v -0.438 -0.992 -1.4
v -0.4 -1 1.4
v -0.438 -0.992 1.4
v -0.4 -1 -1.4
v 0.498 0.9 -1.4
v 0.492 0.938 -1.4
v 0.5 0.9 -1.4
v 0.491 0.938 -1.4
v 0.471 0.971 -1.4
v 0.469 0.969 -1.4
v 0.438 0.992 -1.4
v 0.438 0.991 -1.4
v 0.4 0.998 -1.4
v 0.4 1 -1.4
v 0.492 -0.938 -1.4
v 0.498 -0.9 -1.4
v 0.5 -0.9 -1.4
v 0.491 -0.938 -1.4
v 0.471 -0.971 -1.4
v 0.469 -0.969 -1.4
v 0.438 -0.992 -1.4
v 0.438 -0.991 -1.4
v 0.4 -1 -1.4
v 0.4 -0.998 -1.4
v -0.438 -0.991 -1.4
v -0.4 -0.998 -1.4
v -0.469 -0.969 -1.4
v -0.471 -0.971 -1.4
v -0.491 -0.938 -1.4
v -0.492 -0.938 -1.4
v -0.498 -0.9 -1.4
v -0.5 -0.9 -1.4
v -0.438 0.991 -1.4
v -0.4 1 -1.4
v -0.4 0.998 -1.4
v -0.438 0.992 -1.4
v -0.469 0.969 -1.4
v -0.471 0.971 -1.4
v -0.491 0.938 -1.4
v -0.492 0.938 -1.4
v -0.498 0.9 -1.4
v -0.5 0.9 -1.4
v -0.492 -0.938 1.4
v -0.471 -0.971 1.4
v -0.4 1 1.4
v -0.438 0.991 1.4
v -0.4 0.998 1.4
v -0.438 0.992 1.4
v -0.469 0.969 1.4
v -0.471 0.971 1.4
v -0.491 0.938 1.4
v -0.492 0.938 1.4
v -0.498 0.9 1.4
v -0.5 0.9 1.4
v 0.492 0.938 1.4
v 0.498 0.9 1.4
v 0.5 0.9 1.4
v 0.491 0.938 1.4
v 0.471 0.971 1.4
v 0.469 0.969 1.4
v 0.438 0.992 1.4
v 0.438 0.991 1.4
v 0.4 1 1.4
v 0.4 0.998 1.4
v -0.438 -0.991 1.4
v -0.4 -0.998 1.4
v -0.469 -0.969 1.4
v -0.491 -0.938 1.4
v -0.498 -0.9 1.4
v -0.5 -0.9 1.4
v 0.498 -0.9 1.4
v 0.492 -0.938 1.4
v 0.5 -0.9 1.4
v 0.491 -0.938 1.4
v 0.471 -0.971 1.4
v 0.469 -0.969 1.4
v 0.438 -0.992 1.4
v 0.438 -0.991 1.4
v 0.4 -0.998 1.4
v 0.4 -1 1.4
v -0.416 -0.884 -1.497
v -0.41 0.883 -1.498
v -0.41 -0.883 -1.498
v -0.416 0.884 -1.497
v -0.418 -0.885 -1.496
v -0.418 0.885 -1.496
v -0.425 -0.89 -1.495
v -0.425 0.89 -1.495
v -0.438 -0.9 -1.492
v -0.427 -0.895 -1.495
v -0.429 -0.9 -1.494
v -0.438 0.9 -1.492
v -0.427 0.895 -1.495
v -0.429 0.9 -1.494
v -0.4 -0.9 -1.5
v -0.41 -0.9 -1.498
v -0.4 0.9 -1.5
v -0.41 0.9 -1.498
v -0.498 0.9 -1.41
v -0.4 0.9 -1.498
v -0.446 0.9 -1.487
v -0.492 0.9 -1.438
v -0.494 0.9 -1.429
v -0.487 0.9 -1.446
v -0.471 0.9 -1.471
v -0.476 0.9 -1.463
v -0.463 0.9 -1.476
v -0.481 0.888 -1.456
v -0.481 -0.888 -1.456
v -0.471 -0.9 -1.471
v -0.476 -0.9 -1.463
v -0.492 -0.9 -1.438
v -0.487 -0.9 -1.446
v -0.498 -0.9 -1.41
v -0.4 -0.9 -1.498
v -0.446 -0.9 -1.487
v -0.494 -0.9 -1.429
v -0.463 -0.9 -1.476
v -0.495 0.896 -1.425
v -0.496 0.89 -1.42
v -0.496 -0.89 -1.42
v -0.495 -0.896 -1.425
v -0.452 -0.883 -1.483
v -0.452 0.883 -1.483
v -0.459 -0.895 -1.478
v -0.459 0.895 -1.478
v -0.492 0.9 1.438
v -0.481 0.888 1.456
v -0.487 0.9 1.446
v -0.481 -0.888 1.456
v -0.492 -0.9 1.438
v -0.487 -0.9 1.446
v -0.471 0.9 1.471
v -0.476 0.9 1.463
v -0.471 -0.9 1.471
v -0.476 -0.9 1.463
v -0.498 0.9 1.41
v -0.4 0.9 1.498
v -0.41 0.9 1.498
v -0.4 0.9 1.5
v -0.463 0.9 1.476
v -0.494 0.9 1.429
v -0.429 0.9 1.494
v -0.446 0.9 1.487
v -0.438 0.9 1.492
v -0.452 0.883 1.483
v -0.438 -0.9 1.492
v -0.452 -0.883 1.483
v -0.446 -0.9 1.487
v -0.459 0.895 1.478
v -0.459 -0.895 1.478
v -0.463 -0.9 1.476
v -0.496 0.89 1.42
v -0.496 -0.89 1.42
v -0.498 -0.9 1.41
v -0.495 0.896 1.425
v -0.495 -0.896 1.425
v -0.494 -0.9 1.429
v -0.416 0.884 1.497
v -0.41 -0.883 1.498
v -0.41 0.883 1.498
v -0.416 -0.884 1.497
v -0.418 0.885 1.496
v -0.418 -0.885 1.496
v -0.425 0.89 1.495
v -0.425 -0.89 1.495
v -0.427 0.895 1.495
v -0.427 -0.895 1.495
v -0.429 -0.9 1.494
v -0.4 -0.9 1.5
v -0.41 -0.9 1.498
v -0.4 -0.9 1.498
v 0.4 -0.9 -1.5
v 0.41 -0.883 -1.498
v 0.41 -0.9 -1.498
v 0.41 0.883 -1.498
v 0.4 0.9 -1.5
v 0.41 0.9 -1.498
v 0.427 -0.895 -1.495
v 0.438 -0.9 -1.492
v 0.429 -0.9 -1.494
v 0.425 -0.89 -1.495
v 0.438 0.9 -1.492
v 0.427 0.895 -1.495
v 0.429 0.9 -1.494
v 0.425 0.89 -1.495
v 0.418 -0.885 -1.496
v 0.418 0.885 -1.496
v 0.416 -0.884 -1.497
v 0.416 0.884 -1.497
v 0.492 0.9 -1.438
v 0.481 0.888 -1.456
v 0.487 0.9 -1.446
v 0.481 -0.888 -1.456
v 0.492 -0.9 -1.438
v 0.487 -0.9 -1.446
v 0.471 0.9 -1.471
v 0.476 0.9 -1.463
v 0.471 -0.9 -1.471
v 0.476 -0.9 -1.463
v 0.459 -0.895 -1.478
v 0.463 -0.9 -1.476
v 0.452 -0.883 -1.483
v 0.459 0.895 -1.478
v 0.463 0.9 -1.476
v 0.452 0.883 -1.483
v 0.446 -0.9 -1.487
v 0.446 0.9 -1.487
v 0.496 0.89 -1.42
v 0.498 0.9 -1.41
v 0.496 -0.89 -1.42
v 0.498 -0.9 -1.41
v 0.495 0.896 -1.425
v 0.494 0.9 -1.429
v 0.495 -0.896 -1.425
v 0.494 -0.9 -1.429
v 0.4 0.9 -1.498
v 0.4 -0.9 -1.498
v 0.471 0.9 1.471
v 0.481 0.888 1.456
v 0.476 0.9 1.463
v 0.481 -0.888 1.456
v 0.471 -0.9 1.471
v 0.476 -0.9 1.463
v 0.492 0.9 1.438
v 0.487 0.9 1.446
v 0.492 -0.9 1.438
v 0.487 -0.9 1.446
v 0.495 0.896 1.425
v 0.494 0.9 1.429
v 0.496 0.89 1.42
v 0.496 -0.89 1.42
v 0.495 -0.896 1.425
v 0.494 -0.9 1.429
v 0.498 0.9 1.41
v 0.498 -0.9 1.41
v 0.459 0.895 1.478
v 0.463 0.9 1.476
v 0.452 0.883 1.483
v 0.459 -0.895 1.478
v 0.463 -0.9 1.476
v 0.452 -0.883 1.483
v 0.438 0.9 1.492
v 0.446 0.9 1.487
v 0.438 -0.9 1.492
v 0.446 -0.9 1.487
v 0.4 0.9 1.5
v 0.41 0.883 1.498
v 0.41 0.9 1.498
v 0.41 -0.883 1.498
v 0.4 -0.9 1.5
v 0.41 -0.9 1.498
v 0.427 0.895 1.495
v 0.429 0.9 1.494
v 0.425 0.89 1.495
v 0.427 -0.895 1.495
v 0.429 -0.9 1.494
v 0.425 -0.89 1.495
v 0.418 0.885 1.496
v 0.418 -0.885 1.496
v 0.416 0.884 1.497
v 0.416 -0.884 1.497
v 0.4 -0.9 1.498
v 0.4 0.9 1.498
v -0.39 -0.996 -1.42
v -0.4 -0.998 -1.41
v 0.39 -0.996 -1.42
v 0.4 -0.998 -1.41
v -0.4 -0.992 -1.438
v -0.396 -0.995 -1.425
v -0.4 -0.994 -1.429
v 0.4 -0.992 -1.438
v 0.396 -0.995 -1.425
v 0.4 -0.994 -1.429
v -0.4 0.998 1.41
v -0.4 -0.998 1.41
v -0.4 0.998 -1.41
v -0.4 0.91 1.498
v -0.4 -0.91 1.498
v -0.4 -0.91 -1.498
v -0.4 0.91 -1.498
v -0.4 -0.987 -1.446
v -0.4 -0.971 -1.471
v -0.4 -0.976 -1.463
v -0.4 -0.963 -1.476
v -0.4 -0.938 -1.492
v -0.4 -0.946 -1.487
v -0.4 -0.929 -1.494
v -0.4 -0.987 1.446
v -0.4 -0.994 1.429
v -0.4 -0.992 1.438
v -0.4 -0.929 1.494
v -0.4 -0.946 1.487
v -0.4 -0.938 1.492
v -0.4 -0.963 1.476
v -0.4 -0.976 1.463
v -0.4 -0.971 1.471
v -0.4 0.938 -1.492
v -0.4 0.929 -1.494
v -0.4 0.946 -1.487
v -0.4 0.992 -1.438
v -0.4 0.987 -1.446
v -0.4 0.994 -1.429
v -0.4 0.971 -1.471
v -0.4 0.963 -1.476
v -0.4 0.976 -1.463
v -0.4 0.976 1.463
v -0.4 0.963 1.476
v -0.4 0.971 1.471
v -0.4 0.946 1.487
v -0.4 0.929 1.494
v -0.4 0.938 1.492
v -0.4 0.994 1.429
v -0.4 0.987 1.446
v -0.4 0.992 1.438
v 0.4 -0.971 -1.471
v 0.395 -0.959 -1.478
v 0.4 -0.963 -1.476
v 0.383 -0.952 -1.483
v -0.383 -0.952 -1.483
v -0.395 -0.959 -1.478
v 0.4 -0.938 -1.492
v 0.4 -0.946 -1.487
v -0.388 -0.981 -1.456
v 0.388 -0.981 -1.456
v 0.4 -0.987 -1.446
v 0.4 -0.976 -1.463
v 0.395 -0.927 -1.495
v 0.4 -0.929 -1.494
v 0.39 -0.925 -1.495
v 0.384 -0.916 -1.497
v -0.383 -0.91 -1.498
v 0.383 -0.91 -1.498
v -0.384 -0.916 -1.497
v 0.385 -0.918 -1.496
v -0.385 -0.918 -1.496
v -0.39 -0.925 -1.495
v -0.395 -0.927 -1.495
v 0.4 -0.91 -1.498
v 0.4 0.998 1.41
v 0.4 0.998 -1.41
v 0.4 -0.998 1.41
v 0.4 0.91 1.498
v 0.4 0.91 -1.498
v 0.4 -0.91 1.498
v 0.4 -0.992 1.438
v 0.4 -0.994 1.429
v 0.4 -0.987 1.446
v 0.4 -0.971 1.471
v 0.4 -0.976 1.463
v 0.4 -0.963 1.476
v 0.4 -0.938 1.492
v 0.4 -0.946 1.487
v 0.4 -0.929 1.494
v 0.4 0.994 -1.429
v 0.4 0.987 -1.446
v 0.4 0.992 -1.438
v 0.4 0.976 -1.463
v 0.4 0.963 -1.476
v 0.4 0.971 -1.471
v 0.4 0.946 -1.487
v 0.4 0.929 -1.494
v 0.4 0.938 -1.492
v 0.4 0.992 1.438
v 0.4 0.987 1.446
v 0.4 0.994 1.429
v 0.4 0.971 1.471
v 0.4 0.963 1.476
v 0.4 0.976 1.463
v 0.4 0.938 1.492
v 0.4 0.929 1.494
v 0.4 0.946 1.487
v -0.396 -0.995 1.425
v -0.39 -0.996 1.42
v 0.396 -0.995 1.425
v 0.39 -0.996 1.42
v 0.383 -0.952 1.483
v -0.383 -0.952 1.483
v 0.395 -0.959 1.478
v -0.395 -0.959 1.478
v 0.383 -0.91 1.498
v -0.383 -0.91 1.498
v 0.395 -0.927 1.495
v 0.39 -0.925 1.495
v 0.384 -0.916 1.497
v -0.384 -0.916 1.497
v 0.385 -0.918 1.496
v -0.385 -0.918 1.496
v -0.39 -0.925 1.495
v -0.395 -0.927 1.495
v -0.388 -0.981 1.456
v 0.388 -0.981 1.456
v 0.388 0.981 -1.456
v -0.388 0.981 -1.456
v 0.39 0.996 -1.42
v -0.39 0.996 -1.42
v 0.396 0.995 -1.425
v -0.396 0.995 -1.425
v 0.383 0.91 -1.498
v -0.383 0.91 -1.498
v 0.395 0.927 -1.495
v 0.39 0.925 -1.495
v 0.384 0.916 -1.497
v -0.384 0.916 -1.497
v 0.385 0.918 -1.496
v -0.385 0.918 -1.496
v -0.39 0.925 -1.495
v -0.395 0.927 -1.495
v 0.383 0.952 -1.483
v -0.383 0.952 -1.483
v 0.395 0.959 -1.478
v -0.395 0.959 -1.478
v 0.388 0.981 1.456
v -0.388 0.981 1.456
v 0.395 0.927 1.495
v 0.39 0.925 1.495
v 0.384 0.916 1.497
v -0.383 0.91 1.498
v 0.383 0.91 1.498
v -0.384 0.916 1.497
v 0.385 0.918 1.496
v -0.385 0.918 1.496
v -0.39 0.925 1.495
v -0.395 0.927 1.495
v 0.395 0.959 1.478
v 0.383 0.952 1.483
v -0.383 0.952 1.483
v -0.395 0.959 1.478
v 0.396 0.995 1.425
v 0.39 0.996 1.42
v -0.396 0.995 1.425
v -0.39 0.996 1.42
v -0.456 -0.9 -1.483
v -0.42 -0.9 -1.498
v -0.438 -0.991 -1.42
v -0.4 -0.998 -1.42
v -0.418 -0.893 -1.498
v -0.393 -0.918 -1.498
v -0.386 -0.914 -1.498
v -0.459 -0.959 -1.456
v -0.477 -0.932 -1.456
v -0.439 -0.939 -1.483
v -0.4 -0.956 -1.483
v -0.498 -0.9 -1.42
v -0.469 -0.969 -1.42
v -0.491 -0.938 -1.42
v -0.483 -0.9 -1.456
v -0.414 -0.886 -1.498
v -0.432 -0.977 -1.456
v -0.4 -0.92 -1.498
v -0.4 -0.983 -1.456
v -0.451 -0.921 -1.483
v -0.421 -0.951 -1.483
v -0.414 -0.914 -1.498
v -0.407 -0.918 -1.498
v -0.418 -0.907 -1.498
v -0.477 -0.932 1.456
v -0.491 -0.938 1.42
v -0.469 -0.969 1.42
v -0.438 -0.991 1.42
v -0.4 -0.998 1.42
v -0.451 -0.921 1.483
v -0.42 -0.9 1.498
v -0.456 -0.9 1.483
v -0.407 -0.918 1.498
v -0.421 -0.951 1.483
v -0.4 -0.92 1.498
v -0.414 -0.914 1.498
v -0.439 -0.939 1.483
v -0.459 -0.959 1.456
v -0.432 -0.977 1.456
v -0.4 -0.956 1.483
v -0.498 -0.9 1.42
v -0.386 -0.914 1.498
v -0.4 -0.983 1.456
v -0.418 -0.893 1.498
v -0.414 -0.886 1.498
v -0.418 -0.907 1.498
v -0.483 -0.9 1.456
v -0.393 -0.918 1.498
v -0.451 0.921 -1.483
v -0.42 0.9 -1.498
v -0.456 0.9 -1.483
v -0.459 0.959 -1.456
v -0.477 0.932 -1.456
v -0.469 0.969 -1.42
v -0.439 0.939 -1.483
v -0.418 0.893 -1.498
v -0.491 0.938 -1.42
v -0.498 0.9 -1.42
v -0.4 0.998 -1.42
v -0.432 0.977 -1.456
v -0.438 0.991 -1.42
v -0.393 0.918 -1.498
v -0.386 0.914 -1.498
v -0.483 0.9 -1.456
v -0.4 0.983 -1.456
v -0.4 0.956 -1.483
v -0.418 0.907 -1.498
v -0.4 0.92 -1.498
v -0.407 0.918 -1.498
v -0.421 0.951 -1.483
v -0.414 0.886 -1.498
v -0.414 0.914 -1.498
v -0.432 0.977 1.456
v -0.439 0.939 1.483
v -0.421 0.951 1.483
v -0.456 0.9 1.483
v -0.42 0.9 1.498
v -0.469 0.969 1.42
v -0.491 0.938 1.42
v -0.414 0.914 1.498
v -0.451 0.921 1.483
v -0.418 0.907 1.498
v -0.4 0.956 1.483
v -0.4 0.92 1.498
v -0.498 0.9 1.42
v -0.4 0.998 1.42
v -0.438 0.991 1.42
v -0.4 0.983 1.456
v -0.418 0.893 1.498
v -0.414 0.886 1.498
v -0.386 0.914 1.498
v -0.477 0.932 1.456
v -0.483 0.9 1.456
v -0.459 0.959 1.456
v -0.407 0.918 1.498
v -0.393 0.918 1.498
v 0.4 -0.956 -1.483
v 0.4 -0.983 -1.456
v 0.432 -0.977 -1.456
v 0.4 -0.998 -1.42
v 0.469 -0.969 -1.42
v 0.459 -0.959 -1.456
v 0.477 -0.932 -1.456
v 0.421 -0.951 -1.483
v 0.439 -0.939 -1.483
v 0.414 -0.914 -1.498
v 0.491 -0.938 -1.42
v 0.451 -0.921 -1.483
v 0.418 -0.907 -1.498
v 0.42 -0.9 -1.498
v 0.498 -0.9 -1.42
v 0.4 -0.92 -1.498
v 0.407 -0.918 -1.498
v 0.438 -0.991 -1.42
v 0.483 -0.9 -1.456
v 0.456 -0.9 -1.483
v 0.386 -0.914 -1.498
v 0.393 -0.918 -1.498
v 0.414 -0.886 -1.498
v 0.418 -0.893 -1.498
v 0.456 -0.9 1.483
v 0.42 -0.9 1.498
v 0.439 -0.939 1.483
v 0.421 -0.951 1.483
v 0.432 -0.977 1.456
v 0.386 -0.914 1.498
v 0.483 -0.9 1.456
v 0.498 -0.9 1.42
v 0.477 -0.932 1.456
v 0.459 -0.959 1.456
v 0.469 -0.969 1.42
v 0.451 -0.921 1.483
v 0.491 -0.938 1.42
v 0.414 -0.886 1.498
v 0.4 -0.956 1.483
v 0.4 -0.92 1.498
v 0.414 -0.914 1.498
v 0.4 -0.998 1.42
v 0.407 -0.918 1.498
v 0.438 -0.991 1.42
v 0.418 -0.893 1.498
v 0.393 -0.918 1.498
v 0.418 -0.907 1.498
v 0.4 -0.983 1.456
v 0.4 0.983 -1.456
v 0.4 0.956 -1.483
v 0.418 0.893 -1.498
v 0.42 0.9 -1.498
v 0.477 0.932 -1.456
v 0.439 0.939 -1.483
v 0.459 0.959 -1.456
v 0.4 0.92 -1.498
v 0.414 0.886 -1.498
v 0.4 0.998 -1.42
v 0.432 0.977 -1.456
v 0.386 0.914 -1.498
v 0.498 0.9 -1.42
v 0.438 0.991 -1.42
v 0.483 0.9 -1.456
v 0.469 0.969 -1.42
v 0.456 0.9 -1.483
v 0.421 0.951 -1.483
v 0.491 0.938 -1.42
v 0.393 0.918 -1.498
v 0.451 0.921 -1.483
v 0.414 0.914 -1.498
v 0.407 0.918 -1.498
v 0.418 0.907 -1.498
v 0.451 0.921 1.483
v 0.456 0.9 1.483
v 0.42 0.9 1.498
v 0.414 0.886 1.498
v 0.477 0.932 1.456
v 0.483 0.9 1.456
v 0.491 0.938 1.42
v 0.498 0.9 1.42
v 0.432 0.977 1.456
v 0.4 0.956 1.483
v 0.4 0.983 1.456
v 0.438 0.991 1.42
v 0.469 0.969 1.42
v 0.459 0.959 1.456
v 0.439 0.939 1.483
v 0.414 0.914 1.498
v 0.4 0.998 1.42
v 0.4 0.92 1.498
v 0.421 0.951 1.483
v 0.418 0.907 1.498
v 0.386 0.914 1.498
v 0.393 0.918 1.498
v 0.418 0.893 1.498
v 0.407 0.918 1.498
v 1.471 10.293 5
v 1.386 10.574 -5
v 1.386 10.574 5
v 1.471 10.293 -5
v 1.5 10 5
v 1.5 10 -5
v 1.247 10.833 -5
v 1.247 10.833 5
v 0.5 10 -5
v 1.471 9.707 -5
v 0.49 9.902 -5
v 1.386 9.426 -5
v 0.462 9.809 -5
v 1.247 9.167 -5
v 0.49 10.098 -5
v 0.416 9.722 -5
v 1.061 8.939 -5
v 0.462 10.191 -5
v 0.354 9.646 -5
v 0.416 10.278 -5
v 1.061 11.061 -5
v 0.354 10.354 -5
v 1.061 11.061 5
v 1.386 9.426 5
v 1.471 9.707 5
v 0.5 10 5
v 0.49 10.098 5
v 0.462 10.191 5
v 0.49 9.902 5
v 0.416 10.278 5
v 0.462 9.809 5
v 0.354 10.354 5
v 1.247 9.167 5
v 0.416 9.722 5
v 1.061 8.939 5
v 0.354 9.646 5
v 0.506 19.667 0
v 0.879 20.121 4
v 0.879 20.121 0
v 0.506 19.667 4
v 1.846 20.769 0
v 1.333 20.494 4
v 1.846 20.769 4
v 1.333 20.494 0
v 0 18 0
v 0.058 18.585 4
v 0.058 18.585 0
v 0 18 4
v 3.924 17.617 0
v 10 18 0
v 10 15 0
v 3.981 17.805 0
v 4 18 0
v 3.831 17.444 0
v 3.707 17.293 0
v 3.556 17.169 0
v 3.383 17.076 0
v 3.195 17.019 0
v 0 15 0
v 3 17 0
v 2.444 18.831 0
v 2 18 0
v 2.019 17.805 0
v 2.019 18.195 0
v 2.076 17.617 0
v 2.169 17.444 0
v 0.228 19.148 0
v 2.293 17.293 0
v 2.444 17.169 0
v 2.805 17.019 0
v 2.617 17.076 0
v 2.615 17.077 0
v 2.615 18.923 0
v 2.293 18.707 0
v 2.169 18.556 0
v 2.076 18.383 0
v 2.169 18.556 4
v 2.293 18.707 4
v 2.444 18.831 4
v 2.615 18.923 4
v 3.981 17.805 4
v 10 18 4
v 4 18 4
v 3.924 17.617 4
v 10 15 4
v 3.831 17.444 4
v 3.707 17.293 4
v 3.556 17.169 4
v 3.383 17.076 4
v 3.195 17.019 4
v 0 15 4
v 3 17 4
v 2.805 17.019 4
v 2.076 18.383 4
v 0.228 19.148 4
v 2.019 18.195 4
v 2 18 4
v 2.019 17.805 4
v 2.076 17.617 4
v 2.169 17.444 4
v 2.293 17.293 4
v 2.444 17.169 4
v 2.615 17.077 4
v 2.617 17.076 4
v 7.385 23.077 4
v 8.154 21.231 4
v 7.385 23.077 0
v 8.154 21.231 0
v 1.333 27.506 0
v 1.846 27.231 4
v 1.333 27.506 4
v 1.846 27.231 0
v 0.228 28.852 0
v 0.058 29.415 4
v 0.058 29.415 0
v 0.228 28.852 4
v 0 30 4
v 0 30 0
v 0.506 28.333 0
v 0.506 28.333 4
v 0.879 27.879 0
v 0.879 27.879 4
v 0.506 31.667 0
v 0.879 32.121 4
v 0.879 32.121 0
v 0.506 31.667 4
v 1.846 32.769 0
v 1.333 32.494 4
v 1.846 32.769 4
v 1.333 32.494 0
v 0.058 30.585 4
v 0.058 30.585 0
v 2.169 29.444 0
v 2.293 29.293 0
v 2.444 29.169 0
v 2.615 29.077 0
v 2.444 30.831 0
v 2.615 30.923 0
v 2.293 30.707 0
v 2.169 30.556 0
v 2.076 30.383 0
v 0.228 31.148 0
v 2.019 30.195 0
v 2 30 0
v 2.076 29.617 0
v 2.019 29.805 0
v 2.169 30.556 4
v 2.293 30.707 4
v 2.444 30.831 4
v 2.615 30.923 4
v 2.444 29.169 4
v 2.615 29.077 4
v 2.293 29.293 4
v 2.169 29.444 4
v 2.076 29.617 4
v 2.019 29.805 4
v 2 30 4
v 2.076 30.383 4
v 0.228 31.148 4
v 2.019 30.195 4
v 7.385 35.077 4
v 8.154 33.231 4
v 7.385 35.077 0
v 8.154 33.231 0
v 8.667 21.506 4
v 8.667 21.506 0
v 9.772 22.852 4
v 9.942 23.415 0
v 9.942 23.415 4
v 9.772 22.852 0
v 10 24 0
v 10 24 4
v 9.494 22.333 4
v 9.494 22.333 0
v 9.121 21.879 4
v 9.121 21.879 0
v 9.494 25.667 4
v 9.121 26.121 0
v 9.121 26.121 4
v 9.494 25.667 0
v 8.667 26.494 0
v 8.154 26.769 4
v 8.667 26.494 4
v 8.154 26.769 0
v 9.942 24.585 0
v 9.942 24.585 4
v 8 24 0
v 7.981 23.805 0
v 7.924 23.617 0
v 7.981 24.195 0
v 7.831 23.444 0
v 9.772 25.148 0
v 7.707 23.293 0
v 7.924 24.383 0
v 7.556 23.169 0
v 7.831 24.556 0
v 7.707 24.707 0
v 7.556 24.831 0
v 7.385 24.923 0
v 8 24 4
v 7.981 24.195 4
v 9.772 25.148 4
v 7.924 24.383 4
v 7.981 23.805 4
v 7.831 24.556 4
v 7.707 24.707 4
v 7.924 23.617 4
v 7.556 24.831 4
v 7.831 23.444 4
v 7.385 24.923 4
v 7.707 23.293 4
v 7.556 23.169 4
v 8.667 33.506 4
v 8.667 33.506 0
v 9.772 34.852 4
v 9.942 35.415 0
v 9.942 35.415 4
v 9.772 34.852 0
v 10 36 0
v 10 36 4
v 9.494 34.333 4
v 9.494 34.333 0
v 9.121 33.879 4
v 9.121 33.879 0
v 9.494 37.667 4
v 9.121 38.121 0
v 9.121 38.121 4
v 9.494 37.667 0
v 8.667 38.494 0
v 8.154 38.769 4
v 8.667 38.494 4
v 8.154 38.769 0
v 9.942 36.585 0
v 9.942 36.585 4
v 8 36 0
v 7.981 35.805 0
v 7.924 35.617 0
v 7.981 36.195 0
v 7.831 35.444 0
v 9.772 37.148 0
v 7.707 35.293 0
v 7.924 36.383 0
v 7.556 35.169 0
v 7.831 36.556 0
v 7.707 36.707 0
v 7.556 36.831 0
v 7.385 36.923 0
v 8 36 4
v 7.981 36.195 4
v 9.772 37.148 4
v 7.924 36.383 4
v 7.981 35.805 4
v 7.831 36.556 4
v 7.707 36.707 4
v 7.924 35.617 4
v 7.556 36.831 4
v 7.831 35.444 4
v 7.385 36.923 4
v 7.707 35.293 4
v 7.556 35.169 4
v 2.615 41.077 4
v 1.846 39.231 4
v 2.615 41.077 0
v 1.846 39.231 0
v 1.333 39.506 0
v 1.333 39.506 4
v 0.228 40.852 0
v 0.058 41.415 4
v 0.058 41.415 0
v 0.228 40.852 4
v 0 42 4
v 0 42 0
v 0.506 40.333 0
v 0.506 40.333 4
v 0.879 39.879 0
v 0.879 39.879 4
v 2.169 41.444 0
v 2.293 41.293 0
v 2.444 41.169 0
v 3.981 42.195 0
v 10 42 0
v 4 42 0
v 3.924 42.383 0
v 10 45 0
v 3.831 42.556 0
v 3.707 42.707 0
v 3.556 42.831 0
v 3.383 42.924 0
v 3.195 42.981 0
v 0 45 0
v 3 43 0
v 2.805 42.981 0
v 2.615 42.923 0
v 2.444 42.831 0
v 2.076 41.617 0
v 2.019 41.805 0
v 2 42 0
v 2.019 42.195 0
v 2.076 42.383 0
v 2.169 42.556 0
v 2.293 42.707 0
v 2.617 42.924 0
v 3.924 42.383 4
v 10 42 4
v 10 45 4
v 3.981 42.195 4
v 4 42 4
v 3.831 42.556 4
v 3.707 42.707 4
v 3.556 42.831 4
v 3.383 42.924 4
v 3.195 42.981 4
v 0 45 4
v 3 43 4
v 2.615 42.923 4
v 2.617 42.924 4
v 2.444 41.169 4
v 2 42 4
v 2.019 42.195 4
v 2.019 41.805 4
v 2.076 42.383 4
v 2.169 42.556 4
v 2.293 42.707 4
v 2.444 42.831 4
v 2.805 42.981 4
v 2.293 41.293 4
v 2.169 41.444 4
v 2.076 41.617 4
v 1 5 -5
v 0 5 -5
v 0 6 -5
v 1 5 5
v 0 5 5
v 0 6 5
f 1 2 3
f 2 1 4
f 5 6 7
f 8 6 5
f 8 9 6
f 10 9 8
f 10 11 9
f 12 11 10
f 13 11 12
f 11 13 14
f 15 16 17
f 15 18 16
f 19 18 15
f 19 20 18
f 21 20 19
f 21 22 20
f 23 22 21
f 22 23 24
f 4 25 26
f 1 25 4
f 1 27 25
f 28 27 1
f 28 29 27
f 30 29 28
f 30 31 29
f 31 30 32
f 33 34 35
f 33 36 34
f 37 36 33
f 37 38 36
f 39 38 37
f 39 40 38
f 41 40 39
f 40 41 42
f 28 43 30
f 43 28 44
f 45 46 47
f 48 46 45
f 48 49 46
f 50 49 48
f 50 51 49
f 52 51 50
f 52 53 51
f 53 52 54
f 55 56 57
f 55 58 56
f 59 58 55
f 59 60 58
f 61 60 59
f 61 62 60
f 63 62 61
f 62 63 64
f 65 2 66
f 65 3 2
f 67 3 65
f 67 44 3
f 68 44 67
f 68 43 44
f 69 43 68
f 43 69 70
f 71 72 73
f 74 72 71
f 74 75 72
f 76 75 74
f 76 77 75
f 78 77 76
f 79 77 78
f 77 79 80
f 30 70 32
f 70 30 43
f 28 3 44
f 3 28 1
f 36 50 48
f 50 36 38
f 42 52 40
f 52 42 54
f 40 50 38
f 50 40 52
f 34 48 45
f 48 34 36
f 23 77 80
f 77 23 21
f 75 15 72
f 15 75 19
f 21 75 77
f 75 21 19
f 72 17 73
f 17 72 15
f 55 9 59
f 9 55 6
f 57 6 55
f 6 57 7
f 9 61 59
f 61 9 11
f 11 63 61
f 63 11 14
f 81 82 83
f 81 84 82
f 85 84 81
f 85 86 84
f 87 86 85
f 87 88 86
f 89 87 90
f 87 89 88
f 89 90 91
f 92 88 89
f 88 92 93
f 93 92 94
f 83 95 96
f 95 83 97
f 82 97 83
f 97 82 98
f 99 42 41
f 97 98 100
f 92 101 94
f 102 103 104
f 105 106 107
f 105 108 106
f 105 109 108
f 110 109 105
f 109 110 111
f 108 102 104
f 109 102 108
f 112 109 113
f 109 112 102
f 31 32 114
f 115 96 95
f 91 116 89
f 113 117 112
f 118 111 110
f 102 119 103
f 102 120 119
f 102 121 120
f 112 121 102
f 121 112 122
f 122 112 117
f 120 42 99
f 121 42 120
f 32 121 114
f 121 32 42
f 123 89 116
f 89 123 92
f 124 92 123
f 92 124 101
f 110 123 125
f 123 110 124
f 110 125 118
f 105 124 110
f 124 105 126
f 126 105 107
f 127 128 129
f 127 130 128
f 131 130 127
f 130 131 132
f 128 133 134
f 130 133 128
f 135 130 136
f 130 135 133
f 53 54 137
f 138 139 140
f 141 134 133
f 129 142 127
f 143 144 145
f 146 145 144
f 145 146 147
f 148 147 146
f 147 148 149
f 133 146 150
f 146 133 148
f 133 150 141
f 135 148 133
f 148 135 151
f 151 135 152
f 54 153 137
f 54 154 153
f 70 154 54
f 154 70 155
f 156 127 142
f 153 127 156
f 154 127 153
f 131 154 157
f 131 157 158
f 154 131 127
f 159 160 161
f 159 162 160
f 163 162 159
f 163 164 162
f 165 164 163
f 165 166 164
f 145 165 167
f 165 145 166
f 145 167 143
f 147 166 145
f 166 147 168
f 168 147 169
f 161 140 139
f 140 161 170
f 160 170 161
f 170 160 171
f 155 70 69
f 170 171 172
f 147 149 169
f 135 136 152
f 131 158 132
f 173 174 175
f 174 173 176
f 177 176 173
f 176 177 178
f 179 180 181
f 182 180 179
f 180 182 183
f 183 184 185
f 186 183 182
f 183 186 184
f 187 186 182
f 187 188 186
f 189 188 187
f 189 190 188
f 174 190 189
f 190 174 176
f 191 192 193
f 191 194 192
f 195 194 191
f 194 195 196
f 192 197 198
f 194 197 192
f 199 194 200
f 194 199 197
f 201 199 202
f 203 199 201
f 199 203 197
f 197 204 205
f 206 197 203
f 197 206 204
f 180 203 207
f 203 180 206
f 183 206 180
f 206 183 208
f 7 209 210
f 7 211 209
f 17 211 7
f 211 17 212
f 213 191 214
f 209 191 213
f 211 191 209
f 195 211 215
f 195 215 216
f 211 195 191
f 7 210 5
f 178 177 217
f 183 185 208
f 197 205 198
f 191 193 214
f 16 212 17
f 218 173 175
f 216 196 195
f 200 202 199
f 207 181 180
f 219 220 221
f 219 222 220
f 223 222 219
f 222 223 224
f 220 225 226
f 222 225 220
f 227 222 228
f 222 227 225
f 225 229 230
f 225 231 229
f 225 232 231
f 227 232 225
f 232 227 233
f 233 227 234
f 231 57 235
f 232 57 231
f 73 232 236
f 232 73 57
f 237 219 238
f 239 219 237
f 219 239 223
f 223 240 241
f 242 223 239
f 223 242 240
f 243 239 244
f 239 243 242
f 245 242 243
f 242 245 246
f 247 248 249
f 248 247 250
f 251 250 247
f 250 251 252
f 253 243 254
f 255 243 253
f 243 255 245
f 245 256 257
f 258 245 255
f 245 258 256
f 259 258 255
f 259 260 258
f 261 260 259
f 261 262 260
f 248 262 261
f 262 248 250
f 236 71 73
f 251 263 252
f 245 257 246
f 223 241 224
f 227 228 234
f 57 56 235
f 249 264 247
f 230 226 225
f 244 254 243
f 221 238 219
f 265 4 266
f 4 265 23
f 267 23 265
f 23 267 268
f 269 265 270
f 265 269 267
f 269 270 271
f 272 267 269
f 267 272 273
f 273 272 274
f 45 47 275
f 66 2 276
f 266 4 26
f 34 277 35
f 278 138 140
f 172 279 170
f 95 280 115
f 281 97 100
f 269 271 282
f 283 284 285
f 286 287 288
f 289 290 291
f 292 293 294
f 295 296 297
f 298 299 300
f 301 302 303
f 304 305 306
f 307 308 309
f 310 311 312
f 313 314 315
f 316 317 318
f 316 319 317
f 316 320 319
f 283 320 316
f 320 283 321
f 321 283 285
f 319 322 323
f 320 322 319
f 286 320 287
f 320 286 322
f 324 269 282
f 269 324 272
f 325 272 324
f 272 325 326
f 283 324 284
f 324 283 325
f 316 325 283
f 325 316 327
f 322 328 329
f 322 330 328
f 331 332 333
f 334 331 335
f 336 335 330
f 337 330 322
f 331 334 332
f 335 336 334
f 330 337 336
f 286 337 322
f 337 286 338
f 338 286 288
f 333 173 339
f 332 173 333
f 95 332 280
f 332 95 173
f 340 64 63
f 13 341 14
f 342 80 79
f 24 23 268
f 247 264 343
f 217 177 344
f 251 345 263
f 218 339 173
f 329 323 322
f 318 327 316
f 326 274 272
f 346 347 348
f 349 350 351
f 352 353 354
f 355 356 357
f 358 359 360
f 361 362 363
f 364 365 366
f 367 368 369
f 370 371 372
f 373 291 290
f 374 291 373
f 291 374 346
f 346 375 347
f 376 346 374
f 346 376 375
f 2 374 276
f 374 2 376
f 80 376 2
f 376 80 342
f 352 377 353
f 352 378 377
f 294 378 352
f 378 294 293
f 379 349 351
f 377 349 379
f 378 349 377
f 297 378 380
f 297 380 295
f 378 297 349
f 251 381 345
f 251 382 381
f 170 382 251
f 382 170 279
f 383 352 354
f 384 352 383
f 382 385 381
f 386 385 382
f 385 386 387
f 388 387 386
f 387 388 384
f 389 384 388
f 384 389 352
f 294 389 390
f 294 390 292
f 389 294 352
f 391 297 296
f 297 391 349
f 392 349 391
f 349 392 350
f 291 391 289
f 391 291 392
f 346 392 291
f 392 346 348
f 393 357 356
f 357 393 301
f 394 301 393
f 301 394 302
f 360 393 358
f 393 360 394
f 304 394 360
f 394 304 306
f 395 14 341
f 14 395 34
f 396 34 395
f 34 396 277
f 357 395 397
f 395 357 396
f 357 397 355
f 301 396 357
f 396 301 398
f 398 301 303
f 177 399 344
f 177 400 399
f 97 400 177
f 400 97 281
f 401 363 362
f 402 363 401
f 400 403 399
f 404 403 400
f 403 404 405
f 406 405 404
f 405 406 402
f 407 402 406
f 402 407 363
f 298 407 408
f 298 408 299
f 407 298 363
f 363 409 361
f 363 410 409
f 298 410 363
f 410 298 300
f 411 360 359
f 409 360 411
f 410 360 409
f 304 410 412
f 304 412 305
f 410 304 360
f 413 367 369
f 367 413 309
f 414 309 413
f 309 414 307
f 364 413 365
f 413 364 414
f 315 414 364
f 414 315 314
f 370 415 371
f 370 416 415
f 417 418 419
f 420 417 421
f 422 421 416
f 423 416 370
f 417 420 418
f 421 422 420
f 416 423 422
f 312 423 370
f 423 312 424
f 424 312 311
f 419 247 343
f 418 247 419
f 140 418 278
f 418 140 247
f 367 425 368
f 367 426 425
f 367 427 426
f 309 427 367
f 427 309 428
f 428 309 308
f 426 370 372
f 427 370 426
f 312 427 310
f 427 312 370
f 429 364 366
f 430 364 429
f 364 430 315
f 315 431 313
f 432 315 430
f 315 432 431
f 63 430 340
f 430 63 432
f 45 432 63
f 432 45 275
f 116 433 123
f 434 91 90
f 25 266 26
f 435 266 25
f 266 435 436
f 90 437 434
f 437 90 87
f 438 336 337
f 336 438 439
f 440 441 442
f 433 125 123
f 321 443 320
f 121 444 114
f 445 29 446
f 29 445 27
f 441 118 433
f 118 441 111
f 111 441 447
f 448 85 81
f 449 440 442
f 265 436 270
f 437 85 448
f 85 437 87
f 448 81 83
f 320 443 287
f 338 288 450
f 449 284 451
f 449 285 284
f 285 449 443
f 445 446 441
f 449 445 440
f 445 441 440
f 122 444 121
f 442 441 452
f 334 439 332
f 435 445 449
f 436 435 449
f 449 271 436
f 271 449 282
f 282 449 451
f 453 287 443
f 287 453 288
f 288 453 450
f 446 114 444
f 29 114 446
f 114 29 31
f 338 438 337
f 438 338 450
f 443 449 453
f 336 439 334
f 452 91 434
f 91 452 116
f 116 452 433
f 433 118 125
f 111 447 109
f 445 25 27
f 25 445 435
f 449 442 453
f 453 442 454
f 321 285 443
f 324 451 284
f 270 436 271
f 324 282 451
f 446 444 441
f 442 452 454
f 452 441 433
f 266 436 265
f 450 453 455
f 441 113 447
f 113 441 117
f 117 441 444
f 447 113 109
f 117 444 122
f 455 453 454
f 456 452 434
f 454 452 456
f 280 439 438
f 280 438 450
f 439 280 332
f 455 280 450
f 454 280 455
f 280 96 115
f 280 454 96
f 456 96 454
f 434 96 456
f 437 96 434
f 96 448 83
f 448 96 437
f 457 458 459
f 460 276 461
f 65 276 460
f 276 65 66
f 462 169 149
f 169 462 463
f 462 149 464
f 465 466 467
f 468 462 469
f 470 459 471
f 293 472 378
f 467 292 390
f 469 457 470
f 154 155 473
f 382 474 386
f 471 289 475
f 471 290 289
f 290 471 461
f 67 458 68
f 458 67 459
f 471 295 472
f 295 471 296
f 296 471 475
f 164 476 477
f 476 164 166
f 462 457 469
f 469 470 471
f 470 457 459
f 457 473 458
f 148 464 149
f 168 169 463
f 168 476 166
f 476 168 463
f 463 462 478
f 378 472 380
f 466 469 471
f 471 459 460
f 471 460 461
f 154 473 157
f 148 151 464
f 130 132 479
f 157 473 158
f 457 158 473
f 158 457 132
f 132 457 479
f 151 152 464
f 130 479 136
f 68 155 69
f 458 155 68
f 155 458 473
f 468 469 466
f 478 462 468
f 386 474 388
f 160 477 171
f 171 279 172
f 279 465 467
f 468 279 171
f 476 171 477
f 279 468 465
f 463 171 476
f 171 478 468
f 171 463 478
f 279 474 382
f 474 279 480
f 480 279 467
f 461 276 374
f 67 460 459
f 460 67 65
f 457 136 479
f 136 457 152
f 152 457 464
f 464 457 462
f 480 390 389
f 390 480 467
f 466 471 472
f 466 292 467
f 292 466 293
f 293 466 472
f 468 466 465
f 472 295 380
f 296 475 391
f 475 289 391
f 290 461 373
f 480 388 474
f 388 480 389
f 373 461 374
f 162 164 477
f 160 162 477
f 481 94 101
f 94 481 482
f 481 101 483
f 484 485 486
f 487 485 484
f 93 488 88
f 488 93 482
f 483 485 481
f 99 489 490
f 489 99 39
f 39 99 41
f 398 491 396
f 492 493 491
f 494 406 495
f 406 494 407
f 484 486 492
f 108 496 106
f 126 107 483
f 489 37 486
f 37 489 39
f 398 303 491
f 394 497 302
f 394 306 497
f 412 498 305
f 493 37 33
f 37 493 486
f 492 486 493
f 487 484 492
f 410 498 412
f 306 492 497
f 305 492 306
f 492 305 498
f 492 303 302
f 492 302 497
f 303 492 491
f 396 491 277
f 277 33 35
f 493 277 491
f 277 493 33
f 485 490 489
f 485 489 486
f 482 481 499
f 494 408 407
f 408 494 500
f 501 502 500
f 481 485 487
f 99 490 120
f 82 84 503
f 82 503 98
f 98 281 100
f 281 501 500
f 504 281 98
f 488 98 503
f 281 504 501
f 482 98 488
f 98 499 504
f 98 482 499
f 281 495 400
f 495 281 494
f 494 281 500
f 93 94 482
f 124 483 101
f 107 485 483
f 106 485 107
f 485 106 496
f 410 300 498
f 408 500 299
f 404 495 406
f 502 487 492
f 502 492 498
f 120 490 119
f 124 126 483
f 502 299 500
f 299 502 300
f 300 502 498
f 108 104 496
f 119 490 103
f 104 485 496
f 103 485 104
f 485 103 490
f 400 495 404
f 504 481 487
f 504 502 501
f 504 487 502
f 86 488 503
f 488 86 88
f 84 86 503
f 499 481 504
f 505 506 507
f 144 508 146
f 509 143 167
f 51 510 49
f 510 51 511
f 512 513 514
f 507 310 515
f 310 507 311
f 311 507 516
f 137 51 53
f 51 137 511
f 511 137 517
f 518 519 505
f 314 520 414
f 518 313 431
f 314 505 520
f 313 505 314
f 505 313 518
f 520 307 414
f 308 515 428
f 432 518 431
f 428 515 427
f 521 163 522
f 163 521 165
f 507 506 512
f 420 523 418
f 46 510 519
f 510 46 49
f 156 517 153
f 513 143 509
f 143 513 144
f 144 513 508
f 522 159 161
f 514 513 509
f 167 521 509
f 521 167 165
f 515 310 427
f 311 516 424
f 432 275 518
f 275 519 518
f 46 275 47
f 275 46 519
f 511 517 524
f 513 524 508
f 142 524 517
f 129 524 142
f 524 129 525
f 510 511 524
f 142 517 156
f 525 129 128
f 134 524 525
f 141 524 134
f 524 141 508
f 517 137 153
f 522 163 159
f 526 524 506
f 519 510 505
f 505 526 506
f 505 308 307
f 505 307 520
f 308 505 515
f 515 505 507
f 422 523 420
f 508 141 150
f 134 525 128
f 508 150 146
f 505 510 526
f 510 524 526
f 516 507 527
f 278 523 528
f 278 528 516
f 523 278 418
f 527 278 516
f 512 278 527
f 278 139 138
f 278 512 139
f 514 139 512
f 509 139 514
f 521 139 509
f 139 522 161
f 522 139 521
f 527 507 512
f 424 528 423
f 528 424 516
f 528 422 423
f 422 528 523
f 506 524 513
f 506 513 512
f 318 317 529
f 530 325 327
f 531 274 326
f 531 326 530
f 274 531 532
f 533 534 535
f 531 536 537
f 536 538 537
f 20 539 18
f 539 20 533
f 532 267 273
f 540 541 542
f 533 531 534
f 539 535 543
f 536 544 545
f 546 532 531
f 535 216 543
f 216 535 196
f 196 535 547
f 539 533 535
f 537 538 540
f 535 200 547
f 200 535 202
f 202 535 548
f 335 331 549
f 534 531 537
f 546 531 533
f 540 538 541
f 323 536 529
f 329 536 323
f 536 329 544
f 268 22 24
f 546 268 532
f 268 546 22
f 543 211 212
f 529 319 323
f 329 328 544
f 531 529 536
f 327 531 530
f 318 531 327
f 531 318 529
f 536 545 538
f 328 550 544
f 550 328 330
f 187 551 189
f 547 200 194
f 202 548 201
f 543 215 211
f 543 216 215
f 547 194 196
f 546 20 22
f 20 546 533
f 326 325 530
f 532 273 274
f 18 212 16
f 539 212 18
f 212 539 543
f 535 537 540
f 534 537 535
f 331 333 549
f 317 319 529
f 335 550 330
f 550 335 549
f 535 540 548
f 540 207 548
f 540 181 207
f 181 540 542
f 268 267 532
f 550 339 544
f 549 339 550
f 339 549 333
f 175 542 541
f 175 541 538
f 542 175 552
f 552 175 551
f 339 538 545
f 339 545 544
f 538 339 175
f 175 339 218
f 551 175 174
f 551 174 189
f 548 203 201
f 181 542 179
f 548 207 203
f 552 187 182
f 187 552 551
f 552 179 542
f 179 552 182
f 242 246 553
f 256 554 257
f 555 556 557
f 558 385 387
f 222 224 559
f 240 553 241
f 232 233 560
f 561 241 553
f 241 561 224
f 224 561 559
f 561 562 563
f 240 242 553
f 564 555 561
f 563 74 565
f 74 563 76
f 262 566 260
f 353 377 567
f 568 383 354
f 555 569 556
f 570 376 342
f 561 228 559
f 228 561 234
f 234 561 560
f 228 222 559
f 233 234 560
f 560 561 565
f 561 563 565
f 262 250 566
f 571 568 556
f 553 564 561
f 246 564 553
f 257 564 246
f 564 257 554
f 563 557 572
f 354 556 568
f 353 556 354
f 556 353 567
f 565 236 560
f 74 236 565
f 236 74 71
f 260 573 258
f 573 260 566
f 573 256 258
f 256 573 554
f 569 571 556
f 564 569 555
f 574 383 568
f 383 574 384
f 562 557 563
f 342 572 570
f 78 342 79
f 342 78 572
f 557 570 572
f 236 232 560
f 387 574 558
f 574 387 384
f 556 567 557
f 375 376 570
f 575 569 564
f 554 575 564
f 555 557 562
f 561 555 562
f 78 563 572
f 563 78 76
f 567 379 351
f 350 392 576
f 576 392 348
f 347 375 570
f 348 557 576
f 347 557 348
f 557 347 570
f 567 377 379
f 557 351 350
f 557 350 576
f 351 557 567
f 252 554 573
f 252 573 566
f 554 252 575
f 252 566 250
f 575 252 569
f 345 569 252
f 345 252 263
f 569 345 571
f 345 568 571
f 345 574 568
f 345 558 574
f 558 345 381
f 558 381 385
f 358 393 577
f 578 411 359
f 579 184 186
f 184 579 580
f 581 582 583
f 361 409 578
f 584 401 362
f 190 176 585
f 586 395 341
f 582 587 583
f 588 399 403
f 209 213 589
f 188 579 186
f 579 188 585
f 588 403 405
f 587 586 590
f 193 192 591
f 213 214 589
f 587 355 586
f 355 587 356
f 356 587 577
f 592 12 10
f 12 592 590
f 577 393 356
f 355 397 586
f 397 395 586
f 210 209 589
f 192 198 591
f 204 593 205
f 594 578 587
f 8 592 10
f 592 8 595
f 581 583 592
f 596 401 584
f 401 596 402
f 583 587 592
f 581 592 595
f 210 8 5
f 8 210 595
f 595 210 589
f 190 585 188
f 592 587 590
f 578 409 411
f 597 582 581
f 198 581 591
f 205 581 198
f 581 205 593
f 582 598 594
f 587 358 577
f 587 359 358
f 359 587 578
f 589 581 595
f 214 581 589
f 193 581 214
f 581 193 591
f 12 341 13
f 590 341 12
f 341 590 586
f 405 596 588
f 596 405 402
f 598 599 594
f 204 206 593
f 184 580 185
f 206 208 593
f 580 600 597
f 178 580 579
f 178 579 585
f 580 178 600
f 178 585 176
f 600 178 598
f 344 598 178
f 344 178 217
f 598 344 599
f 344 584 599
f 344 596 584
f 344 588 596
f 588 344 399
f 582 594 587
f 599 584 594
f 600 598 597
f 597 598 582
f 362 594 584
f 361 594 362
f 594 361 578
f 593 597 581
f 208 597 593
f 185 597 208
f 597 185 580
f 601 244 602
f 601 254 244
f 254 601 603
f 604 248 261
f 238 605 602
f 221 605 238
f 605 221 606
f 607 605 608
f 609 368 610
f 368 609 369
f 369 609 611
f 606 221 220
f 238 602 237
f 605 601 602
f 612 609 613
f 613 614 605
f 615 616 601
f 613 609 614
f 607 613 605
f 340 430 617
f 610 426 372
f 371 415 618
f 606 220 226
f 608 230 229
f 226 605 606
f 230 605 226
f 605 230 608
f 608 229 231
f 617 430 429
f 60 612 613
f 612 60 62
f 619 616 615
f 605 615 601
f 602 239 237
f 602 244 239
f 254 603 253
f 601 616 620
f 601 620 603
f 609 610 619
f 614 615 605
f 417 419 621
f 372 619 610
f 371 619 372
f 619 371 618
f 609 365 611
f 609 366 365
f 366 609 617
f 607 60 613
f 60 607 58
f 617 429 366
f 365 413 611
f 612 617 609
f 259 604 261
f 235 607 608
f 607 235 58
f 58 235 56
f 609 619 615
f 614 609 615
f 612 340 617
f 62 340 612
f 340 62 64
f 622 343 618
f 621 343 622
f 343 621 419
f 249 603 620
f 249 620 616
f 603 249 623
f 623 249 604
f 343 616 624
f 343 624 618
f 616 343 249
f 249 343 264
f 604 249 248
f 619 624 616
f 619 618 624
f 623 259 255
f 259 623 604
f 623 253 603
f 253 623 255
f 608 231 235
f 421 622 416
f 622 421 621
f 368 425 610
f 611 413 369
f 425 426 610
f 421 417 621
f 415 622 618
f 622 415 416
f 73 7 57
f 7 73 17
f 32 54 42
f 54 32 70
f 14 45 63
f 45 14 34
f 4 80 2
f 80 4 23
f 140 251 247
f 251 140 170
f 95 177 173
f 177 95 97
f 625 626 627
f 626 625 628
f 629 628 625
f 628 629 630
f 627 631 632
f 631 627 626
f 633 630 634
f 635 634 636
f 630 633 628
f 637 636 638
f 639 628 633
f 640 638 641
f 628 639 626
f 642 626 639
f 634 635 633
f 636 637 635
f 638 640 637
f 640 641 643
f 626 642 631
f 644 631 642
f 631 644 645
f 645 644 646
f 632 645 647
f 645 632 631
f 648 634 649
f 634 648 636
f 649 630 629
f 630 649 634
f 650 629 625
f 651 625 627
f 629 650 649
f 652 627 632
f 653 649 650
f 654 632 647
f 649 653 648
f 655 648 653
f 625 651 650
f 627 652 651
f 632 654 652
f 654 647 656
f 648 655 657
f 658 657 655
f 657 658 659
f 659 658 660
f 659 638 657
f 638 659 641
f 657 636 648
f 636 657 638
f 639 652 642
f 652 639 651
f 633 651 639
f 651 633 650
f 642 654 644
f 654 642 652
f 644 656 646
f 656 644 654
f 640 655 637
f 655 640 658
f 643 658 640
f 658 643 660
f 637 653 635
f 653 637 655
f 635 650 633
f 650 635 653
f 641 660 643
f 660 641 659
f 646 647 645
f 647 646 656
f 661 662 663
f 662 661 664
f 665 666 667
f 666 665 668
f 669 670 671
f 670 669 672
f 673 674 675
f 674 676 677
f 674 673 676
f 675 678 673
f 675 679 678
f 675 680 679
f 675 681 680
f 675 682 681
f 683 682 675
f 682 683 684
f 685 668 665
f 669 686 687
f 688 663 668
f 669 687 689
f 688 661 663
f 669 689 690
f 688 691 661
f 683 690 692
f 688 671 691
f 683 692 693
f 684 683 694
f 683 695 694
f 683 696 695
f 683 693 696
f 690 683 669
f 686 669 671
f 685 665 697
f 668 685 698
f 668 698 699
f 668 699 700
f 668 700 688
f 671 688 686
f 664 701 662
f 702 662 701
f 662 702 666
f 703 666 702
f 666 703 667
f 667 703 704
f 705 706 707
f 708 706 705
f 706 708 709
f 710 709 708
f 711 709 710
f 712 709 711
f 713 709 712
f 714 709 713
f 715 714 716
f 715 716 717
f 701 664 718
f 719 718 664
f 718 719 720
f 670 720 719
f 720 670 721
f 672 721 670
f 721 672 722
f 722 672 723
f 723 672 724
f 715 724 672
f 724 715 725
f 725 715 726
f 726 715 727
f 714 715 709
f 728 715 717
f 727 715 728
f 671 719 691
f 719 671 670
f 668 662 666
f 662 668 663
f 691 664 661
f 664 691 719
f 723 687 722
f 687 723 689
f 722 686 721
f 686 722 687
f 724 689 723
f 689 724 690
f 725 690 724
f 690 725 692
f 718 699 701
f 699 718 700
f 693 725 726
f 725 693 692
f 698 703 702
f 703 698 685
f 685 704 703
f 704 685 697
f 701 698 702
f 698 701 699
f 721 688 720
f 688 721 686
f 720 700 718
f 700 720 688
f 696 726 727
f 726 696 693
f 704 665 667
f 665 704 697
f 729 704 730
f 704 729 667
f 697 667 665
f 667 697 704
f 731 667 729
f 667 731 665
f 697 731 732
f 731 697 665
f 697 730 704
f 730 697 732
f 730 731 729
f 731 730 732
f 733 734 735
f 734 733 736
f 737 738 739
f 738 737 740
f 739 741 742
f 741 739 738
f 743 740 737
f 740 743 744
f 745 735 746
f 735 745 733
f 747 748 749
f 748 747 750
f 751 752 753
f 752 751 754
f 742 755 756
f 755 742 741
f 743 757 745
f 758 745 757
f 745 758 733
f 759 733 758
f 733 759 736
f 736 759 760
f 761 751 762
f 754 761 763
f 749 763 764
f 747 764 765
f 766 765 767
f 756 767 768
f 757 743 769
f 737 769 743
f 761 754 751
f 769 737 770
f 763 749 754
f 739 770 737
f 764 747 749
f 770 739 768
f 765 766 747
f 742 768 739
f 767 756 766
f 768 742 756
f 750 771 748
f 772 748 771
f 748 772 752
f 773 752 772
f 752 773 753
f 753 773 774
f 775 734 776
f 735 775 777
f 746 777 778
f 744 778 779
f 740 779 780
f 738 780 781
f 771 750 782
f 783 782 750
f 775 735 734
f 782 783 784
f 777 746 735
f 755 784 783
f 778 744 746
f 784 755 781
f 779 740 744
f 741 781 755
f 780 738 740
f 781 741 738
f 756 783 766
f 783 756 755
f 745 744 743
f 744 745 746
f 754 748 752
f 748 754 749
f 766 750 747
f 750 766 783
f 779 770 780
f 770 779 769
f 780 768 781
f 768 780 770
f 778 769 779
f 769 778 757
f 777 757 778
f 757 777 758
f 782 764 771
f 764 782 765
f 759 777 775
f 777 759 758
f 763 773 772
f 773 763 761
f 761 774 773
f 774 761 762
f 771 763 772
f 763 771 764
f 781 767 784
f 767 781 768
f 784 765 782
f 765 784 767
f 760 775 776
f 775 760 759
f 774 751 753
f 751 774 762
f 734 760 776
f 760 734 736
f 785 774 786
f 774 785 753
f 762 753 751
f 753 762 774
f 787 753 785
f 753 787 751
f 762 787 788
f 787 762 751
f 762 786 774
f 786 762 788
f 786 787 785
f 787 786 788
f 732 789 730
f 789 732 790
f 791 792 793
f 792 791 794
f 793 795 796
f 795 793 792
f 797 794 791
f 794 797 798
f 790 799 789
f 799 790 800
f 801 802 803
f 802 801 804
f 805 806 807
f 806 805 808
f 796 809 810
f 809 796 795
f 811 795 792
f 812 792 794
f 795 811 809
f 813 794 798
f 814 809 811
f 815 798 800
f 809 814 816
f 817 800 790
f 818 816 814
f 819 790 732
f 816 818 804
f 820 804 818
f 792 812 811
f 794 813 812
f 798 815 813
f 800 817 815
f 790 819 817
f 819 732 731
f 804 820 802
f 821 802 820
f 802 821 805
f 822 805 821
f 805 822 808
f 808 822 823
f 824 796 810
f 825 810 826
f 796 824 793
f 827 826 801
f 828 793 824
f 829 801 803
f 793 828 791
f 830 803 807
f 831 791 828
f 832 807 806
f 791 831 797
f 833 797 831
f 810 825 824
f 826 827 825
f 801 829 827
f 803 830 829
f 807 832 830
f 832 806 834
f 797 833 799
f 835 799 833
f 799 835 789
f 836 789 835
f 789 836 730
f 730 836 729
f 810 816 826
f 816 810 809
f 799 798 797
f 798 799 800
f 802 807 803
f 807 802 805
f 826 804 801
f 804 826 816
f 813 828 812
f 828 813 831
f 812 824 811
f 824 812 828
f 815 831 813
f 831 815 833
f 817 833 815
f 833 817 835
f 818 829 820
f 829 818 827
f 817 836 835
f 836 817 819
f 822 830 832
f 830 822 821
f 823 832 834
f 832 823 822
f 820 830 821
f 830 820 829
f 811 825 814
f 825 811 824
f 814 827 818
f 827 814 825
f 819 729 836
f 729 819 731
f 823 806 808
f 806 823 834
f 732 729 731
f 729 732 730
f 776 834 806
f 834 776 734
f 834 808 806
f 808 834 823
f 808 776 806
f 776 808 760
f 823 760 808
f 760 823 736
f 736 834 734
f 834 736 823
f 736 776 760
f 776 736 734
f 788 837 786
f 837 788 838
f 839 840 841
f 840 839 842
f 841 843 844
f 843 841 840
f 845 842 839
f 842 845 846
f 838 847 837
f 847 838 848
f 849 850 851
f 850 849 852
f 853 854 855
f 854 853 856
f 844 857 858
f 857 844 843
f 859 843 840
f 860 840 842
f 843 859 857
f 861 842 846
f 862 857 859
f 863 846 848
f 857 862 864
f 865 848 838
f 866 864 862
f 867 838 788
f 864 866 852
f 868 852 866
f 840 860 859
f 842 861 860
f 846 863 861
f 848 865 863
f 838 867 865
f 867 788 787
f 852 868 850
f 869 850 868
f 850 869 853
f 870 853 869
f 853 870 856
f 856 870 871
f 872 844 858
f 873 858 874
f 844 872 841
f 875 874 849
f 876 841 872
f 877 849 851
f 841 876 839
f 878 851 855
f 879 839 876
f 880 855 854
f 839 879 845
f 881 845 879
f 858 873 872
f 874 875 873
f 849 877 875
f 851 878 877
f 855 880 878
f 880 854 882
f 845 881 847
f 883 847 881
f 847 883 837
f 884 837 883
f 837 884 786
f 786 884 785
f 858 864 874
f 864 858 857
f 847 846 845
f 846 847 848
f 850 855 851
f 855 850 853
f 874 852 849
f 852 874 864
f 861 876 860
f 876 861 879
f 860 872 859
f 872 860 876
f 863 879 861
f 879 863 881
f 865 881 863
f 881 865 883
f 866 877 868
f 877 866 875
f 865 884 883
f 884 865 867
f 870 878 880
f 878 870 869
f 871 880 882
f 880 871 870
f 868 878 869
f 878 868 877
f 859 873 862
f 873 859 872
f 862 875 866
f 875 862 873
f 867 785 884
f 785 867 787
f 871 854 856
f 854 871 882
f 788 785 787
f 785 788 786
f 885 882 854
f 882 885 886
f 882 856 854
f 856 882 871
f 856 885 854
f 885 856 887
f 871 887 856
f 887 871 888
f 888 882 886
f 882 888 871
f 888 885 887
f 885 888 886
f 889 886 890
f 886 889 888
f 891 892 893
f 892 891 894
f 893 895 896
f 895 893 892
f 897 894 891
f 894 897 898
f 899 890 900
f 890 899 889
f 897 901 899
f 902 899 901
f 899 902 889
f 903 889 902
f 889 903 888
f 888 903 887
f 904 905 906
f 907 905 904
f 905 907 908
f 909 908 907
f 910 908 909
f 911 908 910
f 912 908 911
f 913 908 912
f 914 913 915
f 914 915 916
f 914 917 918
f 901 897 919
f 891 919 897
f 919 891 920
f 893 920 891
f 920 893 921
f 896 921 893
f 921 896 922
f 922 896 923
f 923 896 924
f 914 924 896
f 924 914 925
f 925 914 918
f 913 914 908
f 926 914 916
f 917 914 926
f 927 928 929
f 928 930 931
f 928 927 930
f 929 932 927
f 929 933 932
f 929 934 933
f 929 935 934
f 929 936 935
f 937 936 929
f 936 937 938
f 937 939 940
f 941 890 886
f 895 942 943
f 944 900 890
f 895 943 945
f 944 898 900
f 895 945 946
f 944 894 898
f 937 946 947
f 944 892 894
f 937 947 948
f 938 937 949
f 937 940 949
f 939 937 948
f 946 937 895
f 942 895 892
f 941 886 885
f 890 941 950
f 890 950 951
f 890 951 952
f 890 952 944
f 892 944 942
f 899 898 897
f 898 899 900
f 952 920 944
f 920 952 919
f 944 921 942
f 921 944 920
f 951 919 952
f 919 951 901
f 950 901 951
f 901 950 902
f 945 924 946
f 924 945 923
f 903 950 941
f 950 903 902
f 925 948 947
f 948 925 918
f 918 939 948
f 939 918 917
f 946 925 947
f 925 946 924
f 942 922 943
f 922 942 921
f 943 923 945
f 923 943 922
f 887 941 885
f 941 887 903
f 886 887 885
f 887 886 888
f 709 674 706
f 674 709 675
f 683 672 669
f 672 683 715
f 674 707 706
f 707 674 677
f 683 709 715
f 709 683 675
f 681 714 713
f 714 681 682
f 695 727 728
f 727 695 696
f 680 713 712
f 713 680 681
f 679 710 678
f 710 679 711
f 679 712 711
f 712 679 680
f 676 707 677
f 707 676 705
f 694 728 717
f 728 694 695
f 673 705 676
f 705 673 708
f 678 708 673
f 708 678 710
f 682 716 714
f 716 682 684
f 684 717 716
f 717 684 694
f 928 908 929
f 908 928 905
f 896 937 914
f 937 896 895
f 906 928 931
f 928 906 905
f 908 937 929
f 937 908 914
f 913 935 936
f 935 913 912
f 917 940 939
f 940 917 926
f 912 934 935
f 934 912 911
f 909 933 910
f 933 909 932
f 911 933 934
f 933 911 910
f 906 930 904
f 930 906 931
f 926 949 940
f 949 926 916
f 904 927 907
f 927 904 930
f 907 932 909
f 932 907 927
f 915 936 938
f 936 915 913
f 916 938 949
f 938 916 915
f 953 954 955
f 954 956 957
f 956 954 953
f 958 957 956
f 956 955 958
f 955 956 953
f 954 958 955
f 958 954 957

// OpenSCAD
// linurs body
// body lets create mode advanced bodies as the standard ones from OpenSCAD as cube cylinder sphere and polyhedron

module prism(face=[[0,0],[1,0],[0,1]], h=1, center=false){  
  linear_extrude(height = h, center = center)
  polygon(points = [ face[0], face[1], face[2]], paths = [ [0, 1, 2]]);   
}
//prism();

module roundcube(size=[1,1,1], r=0.1, center=false, $fn=8){
  t = center==true ? 0 : 1; 
  translate([size[0]/2*t,size[1]/2*t,size[2]/2*t])
  union(){
    cube(size=[size[0],size[1]-2*r,size[2]-2*r],center=true);
    cube(size=[size[0]-2*r,size[1],size[2]-2*r],center=true);
    cube(size=[size[0]-2*r,size[1]-2*r,size[2]],center=true);

    for(x=[-size[0]/2+r,size[0]/2-r]){
      for(y=[-size[1]/2+r,size[1]/2-r]){
        translate([x,y,0])
          cylinder(r=r,h=size[2]-2*r, center=true,$fn=$fn);   
      }
    }

    for(x=[-size[0]/2+r,size[0]/2-r]){
      for(z=[-size[2]/2+r,size[2]/2-r]){
        translate([x,0,z])
          rotate([90,0,0])
          cylinder(r=r,h=size[1]-2*r, center=true,$fn=$fn);   
      }
    }


    for(y=[-size[1]/2+r,size[1]/2-r]){
      for(z=[-size[2]/2+r,size[2]/2-r]){
        translate([0,y,z])
          rotate([0,90,0])
          cylinder(r=r,h=size[0]-2*r, center=true,$fn=$fn);   
      }
    }

    for(x=[-size[0]/2+r,size[0]/2-r]){
      for(y=[-size[1]/2+r,size[1]/2-r]){
        for(z=[-size[2]/2+r,size[2]/2-r]){
          translate([x,y,z])
            sphere(r=r, center=true,$fn=$fn);   
        }
      }
    }
  }
}

module channel(d1=1,d2=3,h=10,a=90, center=false, $fn=32){
   intersection(){     
            difference(){
                cylinder(d=d2,h=h,center=true,$fn=$fn);
                cylinder(d=d1,h=2*h,center=true,$fn=$fn);      
            }
            if((a<180)&&(a>0)){
               t=0.5*d2*tan(a/2); 
               linear_extrude(height=2*h, center = true){
                   polygon(points=[
                                  [0,0],
                                  [d2/2,t],
                                  [d2/2,-t]
                                  ], paths=[[0,1,2]]);       
                }
            }    
            else if(a==180){
               translate([0,d2/2,0])cube([d2/2,d2,2*h]); 
            }    
   }
}

module springelement(x=0, y=0, t=1, s=2, x1=0, y1=0, a=0, l=10, m=0, e=0){
    h=1.5*s/tan(a);
    mirror([m,0,0])translate([-x,y,0]){
        rotate([0,0,180])channel(d1=2,
                d2=3*s,
                h=t,
                a=180-2*a);
        if(e==0){
                translate([x1,y1,-t/2])rotate([0,0,a])cube([l,s,t]);
        }        
    }
}    


module spring(s=2,d=[10,10,1],n=2){
//x center x
//y center y
//z tickness    
//s width of spring rods
    r1=s/2;
    r2=1.5*s;
    
    xi=d.x-3*s; // inner x circle center x
    yi=(d.y-3*s)/n/2;     // inner x circle center x
         
    c=sqrt(pow(xi,2)+pow(yi,2)); // distance between center
    c1=c/(1+r2/r1); // where spring rod cuts line between the two circle centers
    l1=sqrt(pow(c1,2)-pow(r1,2));    
    c2=c-c1;
    l2=sqrt(pow(c2,2)-pow(r2,2));
    l=l1+l2;
    a1=atan(yi/xi);
    a2=acos(r1/c1);
    a3=180-a2-a1;
    a4=90-a3;
    x1=-r1*cos(a3);
    y1=r1*sin(a3);
    
 
    translate([1.5*s,1.5*s,d.z/2]){
    for(i=[0:n-1]){
           springelement(x=0,y=i*yi*2,s=s,t=d.z, x1=x1, y1=y1, a=a4, l=l, m=0);        
    }
    for(i=[0:n-1]){
           springelement(x=xi,y=(2*i+1)*yi,s=s, t=d.z, x1=x1, y1=y1, a=a4, l=l, m=1);        
    }
    springelement(x=0,y=d.y-3*s,s=s,t=d.z, x1=x1, y1=y1, a=a4, l=l, m=0, e=1);
    }
    for(i=[0,1]){
      translate([0,i*d.y,0])mirror([0,i,0])difference(){
          cube([d.x,1.5*s,d.z]);
          translate([1.5*s,1.5*s,0])cylinder(d=s,h=3*d.z,center=true,$fn=32);
      } 
    }    
}



//
roundcube(size=[1,2,3],center=true, $fn=16);
//
translate([0,5,0])prism(h=10,center=true);
//
translate([0,10,0])channel();
//
translate([0,15,0]) spring(d=[10,30,4],n=2, s=2);
